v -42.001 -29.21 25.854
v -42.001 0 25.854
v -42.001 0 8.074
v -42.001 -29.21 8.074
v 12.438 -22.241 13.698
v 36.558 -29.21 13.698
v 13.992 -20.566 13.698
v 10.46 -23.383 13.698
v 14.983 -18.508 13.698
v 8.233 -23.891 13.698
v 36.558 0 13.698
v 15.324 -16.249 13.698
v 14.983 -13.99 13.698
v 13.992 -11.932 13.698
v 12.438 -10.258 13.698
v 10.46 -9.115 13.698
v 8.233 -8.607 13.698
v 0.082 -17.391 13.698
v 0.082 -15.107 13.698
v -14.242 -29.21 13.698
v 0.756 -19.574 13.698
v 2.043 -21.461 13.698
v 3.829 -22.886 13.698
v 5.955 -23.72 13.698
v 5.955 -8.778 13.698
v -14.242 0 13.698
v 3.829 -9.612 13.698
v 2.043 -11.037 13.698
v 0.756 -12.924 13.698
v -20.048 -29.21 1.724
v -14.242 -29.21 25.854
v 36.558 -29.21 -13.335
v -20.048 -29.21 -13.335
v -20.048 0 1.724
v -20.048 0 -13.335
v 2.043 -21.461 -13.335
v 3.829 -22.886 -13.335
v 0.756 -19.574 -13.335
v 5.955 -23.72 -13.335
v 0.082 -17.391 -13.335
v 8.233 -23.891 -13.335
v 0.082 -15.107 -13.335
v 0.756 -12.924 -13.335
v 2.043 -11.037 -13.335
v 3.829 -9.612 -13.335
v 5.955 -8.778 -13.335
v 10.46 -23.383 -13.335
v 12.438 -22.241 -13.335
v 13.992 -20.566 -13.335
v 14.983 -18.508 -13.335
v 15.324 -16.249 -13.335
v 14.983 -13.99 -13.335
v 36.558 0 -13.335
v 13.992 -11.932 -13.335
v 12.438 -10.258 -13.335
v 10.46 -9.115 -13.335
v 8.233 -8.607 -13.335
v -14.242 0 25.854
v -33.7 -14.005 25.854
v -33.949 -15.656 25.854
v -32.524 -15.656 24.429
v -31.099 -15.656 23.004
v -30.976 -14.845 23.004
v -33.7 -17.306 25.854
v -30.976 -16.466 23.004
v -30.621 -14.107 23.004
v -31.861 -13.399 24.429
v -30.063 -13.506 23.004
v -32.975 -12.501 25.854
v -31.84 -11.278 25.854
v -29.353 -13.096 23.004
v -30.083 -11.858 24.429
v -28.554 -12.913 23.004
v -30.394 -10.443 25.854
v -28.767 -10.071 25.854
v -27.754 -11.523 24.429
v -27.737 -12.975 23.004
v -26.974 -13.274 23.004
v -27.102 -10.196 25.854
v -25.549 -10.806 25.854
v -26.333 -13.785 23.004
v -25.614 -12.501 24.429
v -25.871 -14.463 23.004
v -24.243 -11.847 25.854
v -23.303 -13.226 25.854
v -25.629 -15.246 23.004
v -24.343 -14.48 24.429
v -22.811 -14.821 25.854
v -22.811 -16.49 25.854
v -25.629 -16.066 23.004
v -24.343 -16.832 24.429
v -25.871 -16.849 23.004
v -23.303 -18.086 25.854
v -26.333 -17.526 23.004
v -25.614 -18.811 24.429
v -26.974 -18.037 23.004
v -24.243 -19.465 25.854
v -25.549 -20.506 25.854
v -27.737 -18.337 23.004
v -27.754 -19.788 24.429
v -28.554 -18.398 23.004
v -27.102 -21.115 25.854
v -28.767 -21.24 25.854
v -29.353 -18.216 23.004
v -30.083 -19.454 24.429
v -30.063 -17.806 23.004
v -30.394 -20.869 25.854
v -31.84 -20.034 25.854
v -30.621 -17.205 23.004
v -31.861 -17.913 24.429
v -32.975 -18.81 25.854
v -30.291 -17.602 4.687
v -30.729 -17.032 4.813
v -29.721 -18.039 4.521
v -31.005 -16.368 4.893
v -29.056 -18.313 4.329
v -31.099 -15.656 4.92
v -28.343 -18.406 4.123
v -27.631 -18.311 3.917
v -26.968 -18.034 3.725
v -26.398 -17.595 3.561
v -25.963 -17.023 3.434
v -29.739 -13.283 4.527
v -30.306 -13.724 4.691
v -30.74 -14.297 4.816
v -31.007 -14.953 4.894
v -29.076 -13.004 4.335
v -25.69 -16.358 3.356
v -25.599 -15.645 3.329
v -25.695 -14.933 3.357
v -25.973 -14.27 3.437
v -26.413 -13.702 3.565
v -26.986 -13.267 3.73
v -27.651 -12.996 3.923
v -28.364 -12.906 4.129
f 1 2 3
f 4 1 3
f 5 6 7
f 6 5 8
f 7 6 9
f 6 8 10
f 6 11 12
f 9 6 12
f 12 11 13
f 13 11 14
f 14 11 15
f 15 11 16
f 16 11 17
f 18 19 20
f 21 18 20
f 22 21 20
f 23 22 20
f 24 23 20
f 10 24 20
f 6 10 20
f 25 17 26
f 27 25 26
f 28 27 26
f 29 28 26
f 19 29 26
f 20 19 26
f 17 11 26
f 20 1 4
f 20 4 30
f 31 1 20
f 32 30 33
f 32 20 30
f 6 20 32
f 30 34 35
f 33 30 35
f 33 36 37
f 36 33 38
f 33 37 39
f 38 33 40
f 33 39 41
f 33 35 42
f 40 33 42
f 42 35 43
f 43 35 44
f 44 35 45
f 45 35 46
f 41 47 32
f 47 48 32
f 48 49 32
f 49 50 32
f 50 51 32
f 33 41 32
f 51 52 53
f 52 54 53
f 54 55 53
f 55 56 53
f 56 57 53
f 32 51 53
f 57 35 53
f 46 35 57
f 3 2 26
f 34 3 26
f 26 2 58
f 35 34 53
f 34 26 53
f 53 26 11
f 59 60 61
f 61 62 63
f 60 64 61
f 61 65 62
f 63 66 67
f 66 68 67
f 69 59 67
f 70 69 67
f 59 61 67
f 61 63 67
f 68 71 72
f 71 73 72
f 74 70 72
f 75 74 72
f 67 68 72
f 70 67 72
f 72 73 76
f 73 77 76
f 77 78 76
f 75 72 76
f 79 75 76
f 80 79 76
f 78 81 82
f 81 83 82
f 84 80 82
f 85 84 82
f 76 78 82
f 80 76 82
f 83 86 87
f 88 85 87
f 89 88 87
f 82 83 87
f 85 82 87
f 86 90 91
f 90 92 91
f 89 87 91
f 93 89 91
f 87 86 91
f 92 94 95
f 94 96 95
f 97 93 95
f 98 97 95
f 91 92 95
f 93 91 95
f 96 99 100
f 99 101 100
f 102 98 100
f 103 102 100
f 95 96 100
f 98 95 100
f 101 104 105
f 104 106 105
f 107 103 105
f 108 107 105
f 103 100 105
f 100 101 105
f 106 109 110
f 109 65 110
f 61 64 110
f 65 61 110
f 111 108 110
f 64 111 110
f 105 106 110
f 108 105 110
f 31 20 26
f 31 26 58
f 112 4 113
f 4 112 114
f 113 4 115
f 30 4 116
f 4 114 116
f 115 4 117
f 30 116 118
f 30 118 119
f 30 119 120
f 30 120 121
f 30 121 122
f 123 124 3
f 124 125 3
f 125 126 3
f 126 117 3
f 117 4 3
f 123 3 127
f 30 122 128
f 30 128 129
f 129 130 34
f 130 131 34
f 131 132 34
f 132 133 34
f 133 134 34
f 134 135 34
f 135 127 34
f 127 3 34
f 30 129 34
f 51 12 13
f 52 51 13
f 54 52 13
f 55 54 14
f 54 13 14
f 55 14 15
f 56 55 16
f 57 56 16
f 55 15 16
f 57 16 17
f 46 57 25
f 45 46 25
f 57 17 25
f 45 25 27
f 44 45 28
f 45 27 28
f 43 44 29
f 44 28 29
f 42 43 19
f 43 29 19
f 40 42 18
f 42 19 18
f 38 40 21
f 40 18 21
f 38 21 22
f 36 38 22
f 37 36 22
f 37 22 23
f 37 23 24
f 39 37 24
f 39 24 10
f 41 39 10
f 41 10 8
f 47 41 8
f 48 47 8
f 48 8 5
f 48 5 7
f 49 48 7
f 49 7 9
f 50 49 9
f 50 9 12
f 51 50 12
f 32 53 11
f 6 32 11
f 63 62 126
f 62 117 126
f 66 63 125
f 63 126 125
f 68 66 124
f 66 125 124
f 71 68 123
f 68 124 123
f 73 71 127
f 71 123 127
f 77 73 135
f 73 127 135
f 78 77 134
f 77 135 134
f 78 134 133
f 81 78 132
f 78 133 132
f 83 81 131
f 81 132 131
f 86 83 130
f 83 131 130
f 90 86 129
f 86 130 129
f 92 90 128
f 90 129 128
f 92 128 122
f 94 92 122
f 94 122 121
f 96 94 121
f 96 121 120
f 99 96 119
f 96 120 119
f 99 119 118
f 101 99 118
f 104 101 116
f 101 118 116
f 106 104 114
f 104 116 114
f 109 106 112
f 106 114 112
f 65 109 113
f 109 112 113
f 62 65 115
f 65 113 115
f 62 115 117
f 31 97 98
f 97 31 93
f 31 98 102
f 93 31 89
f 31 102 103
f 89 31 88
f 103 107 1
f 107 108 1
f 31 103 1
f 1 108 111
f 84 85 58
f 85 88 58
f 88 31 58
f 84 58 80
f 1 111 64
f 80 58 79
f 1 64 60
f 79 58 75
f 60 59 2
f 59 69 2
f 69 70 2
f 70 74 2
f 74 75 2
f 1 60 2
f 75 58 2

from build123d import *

# Parameters (mm, degrees)
F1_DEPTH       = 29.21
F2_R           = 7.6633678856
F3_DEPTH       = 41.402
F5_D           = 5.5
F5_CSINK_D     = 11.2
F5_CSINK_ANGLE = 90


with BuildPart() as f1:
    # F0 (on Front) → F1 (new body)
    with BuildSketch(Plane.XZ):
        Polygon((-42.0007146895, 25.8535724133), (-42.0007146895, 8.0735711381), (-20.0478583574, 1.7235714477), (-20.0478583574, -13.3350007236), (36.5578569472, -13.3350007236), (36.5578569472, 13.6978570372), (-14.2421433702, 13.6978570372), (-14.2421433702, 25.8535724133), align=None)
    extrude(amount=F1_DEPTH)

    # F2 (on face) → F3 (cut)
    with BuildSketch(Plane.XY.offset(13.6978570372)):
        with Locations((7.6602338813, -16.2490848452)):
            Circle(F2_R)
    extrude(amount=-F3_DEPTH, mode=Mode.SUBTRACT)

    # F5 (through all)
    with Locations(Plane.XY.offset(25.8535724133)):
        with Locations((-28.3485297114, -15.6557932496)):
            CounterSinkHole(F5_D / 2, F5_CSINK_D / 2, counter_sink_angle=F5_CSINK_ANGLE)


solid = f1.part
